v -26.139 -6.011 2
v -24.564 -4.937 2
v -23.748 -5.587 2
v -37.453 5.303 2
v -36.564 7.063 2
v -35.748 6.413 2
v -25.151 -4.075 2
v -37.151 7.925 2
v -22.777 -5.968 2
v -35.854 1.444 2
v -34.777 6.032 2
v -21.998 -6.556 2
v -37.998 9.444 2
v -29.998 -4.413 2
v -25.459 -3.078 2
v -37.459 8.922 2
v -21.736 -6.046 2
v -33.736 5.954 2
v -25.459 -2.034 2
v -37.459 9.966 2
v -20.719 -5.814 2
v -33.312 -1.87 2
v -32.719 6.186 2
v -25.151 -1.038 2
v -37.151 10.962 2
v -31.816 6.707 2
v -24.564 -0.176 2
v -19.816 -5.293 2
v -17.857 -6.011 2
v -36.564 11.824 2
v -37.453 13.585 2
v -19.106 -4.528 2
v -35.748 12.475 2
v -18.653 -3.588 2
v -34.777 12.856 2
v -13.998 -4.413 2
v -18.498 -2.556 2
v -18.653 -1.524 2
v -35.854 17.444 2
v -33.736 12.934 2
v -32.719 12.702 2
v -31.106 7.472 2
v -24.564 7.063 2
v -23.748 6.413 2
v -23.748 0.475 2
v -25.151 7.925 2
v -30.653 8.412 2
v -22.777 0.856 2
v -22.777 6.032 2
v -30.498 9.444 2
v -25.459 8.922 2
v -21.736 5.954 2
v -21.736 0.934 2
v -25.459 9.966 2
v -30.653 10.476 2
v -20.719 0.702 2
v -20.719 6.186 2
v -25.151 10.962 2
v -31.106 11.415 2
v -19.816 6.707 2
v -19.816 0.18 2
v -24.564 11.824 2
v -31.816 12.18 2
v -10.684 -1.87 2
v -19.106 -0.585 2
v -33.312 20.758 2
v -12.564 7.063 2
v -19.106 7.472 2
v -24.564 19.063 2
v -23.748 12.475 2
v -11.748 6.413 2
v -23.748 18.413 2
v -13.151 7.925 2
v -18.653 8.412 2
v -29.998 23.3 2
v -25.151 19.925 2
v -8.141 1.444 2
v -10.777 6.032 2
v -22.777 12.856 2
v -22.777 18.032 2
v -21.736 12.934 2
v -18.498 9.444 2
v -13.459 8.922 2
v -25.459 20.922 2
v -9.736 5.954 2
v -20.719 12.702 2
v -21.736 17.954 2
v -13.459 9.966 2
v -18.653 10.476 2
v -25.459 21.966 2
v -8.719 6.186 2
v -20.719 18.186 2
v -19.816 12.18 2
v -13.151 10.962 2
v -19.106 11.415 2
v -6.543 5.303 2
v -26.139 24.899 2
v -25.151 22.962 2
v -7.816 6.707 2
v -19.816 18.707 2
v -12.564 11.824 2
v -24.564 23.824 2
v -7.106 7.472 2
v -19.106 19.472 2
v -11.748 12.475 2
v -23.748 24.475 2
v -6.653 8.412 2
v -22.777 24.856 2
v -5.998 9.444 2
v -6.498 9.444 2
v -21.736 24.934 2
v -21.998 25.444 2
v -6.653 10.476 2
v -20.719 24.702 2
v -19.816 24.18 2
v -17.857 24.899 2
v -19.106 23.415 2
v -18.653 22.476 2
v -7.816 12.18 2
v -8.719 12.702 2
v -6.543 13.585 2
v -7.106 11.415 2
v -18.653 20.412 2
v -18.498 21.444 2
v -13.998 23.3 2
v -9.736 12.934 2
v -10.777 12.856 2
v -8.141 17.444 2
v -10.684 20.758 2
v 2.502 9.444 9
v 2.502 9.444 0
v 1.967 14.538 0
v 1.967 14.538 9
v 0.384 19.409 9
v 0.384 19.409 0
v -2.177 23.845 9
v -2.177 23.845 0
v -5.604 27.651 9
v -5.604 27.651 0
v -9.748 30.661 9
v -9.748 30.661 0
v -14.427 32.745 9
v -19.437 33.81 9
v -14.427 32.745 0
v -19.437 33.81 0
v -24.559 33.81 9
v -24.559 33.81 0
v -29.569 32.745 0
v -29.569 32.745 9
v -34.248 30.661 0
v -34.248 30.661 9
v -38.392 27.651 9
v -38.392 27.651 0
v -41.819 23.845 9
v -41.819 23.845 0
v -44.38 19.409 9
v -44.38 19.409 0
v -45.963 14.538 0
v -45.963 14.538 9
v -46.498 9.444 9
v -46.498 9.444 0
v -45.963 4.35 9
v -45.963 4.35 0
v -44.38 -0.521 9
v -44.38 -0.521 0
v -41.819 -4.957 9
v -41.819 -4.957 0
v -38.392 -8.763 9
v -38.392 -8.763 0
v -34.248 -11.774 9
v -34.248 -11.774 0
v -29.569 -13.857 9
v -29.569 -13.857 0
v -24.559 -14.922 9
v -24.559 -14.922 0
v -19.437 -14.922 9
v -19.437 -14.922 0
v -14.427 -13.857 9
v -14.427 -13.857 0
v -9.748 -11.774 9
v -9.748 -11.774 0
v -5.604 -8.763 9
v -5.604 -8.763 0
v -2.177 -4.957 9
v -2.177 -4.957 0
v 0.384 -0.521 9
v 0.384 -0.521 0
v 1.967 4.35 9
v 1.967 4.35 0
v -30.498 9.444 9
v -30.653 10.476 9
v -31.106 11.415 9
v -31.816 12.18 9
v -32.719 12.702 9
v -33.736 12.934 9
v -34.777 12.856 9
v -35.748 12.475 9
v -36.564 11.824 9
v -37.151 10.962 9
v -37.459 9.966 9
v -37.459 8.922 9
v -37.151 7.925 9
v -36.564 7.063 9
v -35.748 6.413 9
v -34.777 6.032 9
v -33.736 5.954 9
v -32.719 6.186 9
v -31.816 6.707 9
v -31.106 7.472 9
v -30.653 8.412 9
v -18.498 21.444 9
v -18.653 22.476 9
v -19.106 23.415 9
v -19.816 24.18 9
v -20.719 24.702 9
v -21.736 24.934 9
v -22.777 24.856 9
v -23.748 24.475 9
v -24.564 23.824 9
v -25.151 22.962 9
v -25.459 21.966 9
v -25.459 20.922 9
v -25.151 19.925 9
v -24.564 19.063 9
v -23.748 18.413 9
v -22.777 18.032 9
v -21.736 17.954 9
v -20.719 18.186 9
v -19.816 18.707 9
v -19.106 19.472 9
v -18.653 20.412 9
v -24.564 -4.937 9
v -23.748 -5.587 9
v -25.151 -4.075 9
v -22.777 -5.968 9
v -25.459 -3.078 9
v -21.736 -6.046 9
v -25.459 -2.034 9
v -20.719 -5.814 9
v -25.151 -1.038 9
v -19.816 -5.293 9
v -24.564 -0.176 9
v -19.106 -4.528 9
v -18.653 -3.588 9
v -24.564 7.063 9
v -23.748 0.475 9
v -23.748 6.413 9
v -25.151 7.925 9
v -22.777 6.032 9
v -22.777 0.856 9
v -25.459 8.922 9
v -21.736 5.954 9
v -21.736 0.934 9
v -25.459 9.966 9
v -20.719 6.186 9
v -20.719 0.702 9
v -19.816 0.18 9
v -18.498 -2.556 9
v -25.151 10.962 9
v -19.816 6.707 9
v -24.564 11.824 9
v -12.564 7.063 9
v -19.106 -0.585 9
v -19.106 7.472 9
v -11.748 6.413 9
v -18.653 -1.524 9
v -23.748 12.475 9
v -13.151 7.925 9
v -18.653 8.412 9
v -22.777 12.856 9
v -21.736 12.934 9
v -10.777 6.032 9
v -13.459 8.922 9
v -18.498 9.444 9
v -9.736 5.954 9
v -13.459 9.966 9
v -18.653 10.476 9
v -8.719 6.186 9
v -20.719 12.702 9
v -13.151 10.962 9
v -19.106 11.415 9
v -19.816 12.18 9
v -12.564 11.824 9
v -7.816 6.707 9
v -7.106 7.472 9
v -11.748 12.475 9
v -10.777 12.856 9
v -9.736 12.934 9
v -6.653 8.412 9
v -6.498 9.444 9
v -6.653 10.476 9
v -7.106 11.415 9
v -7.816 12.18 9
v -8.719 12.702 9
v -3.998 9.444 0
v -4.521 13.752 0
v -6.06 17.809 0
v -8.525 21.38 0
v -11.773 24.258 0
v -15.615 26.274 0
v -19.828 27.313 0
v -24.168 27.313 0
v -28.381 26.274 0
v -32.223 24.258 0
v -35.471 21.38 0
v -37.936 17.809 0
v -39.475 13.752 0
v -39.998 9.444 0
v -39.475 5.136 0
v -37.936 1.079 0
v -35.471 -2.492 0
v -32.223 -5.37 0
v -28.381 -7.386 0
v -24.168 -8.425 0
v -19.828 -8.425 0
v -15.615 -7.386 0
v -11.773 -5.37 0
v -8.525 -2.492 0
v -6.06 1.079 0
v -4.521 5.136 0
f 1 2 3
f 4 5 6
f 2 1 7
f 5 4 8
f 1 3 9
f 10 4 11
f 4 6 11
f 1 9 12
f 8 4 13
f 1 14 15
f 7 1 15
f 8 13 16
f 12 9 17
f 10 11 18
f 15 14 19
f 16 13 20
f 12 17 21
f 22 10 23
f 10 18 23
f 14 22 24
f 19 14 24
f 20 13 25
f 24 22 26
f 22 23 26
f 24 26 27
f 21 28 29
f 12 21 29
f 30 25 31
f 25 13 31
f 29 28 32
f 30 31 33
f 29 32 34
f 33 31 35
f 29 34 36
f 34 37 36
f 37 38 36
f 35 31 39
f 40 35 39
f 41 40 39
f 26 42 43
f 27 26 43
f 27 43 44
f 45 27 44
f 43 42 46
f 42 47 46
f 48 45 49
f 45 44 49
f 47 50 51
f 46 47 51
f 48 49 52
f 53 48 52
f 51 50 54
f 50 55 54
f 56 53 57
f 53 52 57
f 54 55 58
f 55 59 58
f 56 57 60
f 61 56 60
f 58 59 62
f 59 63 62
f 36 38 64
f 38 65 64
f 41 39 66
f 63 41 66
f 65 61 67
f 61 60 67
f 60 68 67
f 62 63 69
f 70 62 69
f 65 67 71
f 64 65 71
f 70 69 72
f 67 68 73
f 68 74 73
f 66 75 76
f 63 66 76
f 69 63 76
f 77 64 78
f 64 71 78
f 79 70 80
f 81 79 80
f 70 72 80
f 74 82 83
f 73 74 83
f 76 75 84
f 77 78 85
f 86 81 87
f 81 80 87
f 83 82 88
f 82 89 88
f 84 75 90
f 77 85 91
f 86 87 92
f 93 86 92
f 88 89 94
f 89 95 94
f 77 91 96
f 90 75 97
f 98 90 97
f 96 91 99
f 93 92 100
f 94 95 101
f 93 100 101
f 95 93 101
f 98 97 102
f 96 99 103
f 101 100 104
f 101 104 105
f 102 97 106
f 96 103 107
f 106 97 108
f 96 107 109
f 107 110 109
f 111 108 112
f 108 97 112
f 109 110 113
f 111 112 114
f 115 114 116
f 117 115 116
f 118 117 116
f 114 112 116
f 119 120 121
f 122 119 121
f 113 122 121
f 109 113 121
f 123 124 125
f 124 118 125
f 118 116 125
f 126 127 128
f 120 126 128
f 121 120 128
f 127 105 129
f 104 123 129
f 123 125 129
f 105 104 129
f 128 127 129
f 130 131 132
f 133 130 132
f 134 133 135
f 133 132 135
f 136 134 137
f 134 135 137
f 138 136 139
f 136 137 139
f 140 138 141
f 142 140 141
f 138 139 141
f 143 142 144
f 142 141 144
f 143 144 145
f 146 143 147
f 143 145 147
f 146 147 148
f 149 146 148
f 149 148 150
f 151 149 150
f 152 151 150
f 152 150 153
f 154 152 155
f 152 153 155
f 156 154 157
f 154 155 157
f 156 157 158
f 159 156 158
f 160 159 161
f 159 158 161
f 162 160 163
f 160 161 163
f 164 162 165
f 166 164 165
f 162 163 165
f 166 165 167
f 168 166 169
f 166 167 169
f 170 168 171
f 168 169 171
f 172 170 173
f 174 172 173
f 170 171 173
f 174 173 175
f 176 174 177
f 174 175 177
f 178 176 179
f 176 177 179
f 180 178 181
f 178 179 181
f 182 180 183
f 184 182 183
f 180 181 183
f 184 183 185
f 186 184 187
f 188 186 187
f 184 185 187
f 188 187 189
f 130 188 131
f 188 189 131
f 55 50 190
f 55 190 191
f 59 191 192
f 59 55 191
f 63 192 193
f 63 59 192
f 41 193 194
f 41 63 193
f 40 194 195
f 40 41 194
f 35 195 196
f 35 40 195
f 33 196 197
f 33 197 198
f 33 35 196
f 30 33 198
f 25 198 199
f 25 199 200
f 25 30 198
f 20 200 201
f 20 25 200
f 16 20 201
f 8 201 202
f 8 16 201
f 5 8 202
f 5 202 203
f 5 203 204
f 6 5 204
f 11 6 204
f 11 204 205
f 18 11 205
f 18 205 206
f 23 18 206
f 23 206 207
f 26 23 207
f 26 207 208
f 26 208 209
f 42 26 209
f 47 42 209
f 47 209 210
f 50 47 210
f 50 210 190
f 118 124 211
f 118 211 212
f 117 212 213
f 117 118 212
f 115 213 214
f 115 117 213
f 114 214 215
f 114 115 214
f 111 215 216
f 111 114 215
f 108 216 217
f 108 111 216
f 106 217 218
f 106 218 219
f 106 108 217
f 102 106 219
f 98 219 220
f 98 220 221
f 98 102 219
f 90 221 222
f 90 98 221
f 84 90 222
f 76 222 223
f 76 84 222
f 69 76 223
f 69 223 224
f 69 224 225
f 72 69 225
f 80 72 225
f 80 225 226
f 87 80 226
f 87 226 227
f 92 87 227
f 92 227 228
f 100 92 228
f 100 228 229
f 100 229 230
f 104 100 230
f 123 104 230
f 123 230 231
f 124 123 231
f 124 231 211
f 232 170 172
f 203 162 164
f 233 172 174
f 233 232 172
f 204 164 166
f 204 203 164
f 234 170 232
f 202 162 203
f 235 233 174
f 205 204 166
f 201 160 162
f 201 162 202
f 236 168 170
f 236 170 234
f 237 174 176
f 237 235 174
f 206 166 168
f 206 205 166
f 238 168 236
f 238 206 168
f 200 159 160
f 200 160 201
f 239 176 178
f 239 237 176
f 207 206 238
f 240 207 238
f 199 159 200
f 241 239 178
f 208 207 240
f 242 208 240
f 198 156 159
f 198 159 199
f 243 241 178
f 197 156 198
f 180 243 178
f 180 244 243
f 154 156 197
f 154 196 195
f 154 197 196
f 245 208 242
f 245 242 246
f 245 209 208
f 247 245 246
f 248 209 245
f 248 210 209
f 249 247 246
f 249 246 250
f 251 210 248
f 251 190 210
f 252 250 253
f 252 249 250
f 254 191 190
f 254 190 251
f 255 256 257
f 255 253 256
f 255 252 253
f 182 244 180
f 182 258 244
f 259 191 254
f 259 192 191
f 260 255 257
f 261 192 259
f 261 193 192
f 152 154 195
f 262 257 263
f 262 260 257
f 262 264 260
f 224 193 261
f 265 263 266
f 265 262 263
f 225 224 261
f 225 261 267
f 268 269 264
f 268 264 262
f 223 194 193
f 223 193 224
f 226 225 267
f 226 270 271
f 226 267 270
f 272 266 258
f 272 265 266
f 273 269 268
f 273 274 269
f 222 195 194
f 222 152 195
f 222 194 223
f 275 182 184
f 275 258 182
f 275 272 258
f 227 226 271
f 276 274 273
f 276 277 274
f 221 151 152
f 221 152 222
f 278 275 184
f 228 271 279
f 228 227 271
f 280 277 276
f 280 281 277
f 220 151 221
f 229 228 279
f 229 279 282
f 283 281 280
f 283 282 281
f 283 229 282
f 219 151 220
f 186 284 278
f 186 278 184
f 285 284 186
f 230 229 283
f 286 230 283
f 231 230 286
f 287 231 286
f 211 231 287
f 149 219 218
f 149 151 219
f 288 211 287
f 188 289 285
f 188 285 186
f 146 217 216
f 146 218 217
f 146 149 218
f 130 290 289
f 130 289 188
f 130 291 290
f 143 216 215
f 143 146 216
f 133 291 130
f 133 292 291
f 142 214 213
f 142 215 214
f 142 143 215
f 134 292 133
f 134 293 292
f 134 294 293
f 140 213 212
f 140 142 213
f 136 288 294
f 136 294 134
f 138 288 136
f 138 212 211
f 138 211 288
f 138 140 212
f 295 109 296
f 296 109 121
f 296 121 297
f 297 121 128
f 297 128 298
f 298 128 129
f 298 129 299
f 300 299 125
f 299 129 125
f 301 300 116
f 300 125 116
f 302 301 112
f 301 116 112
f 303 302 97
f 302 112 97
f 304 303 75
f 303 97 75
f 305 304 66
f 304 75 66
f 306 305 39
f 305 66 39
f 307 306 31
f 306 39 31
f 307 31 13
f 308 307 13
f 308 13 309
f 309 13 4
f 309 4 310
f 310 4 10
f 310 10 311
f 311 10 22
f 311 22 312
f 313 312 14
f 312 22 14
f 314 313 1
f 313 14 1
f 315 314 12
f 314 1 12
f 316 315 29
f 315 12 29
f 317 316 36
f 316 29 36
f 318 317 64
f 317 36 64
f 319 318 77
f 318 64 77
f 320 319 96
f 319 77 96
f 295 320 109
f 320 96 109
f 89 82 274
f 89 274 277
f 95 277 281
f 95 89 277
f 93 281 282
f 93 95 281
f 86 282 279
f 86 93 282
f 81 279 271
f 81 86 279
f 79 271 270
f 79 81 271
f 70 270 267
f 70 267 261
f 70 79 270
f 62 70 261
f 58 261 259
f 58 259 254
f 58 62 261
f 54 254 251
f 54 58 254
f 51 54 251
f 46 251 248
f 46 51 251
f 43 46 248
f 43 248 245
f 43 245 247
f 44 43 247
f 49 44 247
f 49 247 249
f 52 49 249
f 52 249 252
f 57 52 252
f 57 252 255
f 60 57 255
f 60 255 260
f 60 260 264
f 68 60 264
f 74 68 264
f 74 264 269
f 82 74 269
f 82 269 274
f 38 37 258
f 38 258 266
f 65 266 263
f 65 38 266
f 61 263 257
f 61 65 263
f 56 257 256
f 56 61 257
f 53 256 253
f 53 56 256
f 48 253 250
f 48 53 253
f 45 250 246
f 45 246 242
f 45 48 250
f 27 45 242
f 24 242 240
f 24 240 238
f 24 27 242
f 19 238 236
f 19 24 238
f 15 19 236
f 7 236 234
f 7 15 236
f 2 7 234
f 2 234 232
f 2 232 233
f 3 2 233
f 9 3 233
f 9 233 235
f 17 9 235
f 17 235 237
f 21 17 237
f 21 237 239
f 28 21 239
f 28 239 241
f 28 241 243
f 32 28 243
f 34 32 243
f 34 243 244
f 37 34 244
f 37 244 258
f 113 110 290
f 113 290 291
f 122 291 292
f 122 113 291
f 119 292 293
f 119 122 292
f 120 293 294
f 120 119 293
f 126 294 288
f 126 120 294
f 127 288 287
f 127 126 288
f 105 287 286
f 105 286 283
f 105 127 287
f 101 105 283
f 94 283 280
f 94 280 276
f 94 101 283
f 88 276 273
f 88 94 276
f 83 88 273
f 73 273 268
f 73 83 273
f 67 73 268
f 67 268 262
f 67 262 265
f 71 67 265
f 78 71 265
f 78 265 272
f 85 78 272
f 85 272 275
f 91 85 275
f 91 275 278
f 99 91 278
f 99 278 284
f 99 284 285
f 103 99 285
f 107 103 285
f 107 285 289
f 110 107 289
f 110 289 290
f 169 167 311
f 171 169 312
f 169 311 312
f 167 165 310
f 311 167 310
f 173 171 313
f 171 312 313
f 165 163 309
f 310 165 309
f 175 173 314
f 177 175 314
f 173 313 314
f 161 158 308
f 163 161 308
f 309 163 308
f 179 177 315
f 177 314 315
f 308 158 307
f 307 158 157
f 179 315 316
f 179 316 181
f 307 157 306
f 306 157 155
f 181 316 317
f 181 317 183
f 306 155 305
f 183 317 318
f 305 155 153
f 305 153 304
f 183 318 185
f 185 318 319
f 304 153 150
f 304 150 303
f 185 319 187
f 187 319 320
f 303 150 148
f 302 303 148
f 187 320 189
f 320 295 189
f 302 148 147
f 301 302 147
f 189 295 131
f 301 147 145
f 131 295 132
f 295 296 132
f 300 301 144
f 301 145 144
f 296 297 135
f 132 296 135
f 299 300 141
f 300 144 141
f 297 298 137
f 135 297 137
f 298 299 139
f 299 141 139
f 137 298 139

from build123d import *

# Parameters (mm, degrees)
ESBO_O1_R                = 24.5
ESBO_O1_R_2              = 18
ESBO_O1_R_3              = 3.5
RESSALTO_EXTRUS_O1_DEPTH = 9
ESBO_O2_R                = 18
CORTE_EXTRUS_O1_DEPTH    = 2
CORTE_EXTRUS_O1_TAPER    = 45


with BuildPart() as part:
    # Esboço1 → Ressalto-extrusão1 (new body)
    # profile 1 of 2: a face of its own
    with BuildSketch(Plane.XY):
        with Locations((-21.997899875, 9.443861076)):
            Circle(ESBO_O1_R)
        with Locations((-21.997899875, 9.443861076)):
            Circle(ESBO_O1_R_2, mode=Mode.SUBTRACT)
    # profile 2 of 2: a face of its own
    with BuildSketch(Plane.XY):
        with Locations((-21.997899875, 9.443861076)):
            Circle(ESBO_O1_R_2)
        with Locations((-33.997899875, 9.443861076)):
            Circle(ESBO_O1_R_3, mode=Mode.SUBTRACT)
        with Locations((-21.997899875, 21.443861076)):
            Circle(ESBO_O1_R_3, mode=Mode.SUBTRACT)
        with Locations((-9.997899875, 9.443861076)):
            Circle(ESBO_O1_R_3, mode=Mode.SUBTRACT)
        with Locations((-21.997899875, -2.556138924)):
            Circle(ESBO_O1_R_3, mode=Mode.SUBTRACT)
        with Locations((-21.997899875, 9.443861076)):
            Circle(ESBO_O1_R_3, mode=Mode.SUBTRACT)
    extrude(amount=RESSALTO_EXTRUS_O1_DEPTH)

    # Esboço2 → Corte-extrusão1 (cut)
    with BuildSketch(Plane.XY):
        with Locations((-21.997899875, 9.443861076)):
            Circle(ESBO_O2_R)
    extrude(amount=CORTE_EXTRUS_O1_DEPTH, taper=CORTE_EXTRUS_O1_TAPER, mode=Mode.SUBTRACT)


solid = part.part
